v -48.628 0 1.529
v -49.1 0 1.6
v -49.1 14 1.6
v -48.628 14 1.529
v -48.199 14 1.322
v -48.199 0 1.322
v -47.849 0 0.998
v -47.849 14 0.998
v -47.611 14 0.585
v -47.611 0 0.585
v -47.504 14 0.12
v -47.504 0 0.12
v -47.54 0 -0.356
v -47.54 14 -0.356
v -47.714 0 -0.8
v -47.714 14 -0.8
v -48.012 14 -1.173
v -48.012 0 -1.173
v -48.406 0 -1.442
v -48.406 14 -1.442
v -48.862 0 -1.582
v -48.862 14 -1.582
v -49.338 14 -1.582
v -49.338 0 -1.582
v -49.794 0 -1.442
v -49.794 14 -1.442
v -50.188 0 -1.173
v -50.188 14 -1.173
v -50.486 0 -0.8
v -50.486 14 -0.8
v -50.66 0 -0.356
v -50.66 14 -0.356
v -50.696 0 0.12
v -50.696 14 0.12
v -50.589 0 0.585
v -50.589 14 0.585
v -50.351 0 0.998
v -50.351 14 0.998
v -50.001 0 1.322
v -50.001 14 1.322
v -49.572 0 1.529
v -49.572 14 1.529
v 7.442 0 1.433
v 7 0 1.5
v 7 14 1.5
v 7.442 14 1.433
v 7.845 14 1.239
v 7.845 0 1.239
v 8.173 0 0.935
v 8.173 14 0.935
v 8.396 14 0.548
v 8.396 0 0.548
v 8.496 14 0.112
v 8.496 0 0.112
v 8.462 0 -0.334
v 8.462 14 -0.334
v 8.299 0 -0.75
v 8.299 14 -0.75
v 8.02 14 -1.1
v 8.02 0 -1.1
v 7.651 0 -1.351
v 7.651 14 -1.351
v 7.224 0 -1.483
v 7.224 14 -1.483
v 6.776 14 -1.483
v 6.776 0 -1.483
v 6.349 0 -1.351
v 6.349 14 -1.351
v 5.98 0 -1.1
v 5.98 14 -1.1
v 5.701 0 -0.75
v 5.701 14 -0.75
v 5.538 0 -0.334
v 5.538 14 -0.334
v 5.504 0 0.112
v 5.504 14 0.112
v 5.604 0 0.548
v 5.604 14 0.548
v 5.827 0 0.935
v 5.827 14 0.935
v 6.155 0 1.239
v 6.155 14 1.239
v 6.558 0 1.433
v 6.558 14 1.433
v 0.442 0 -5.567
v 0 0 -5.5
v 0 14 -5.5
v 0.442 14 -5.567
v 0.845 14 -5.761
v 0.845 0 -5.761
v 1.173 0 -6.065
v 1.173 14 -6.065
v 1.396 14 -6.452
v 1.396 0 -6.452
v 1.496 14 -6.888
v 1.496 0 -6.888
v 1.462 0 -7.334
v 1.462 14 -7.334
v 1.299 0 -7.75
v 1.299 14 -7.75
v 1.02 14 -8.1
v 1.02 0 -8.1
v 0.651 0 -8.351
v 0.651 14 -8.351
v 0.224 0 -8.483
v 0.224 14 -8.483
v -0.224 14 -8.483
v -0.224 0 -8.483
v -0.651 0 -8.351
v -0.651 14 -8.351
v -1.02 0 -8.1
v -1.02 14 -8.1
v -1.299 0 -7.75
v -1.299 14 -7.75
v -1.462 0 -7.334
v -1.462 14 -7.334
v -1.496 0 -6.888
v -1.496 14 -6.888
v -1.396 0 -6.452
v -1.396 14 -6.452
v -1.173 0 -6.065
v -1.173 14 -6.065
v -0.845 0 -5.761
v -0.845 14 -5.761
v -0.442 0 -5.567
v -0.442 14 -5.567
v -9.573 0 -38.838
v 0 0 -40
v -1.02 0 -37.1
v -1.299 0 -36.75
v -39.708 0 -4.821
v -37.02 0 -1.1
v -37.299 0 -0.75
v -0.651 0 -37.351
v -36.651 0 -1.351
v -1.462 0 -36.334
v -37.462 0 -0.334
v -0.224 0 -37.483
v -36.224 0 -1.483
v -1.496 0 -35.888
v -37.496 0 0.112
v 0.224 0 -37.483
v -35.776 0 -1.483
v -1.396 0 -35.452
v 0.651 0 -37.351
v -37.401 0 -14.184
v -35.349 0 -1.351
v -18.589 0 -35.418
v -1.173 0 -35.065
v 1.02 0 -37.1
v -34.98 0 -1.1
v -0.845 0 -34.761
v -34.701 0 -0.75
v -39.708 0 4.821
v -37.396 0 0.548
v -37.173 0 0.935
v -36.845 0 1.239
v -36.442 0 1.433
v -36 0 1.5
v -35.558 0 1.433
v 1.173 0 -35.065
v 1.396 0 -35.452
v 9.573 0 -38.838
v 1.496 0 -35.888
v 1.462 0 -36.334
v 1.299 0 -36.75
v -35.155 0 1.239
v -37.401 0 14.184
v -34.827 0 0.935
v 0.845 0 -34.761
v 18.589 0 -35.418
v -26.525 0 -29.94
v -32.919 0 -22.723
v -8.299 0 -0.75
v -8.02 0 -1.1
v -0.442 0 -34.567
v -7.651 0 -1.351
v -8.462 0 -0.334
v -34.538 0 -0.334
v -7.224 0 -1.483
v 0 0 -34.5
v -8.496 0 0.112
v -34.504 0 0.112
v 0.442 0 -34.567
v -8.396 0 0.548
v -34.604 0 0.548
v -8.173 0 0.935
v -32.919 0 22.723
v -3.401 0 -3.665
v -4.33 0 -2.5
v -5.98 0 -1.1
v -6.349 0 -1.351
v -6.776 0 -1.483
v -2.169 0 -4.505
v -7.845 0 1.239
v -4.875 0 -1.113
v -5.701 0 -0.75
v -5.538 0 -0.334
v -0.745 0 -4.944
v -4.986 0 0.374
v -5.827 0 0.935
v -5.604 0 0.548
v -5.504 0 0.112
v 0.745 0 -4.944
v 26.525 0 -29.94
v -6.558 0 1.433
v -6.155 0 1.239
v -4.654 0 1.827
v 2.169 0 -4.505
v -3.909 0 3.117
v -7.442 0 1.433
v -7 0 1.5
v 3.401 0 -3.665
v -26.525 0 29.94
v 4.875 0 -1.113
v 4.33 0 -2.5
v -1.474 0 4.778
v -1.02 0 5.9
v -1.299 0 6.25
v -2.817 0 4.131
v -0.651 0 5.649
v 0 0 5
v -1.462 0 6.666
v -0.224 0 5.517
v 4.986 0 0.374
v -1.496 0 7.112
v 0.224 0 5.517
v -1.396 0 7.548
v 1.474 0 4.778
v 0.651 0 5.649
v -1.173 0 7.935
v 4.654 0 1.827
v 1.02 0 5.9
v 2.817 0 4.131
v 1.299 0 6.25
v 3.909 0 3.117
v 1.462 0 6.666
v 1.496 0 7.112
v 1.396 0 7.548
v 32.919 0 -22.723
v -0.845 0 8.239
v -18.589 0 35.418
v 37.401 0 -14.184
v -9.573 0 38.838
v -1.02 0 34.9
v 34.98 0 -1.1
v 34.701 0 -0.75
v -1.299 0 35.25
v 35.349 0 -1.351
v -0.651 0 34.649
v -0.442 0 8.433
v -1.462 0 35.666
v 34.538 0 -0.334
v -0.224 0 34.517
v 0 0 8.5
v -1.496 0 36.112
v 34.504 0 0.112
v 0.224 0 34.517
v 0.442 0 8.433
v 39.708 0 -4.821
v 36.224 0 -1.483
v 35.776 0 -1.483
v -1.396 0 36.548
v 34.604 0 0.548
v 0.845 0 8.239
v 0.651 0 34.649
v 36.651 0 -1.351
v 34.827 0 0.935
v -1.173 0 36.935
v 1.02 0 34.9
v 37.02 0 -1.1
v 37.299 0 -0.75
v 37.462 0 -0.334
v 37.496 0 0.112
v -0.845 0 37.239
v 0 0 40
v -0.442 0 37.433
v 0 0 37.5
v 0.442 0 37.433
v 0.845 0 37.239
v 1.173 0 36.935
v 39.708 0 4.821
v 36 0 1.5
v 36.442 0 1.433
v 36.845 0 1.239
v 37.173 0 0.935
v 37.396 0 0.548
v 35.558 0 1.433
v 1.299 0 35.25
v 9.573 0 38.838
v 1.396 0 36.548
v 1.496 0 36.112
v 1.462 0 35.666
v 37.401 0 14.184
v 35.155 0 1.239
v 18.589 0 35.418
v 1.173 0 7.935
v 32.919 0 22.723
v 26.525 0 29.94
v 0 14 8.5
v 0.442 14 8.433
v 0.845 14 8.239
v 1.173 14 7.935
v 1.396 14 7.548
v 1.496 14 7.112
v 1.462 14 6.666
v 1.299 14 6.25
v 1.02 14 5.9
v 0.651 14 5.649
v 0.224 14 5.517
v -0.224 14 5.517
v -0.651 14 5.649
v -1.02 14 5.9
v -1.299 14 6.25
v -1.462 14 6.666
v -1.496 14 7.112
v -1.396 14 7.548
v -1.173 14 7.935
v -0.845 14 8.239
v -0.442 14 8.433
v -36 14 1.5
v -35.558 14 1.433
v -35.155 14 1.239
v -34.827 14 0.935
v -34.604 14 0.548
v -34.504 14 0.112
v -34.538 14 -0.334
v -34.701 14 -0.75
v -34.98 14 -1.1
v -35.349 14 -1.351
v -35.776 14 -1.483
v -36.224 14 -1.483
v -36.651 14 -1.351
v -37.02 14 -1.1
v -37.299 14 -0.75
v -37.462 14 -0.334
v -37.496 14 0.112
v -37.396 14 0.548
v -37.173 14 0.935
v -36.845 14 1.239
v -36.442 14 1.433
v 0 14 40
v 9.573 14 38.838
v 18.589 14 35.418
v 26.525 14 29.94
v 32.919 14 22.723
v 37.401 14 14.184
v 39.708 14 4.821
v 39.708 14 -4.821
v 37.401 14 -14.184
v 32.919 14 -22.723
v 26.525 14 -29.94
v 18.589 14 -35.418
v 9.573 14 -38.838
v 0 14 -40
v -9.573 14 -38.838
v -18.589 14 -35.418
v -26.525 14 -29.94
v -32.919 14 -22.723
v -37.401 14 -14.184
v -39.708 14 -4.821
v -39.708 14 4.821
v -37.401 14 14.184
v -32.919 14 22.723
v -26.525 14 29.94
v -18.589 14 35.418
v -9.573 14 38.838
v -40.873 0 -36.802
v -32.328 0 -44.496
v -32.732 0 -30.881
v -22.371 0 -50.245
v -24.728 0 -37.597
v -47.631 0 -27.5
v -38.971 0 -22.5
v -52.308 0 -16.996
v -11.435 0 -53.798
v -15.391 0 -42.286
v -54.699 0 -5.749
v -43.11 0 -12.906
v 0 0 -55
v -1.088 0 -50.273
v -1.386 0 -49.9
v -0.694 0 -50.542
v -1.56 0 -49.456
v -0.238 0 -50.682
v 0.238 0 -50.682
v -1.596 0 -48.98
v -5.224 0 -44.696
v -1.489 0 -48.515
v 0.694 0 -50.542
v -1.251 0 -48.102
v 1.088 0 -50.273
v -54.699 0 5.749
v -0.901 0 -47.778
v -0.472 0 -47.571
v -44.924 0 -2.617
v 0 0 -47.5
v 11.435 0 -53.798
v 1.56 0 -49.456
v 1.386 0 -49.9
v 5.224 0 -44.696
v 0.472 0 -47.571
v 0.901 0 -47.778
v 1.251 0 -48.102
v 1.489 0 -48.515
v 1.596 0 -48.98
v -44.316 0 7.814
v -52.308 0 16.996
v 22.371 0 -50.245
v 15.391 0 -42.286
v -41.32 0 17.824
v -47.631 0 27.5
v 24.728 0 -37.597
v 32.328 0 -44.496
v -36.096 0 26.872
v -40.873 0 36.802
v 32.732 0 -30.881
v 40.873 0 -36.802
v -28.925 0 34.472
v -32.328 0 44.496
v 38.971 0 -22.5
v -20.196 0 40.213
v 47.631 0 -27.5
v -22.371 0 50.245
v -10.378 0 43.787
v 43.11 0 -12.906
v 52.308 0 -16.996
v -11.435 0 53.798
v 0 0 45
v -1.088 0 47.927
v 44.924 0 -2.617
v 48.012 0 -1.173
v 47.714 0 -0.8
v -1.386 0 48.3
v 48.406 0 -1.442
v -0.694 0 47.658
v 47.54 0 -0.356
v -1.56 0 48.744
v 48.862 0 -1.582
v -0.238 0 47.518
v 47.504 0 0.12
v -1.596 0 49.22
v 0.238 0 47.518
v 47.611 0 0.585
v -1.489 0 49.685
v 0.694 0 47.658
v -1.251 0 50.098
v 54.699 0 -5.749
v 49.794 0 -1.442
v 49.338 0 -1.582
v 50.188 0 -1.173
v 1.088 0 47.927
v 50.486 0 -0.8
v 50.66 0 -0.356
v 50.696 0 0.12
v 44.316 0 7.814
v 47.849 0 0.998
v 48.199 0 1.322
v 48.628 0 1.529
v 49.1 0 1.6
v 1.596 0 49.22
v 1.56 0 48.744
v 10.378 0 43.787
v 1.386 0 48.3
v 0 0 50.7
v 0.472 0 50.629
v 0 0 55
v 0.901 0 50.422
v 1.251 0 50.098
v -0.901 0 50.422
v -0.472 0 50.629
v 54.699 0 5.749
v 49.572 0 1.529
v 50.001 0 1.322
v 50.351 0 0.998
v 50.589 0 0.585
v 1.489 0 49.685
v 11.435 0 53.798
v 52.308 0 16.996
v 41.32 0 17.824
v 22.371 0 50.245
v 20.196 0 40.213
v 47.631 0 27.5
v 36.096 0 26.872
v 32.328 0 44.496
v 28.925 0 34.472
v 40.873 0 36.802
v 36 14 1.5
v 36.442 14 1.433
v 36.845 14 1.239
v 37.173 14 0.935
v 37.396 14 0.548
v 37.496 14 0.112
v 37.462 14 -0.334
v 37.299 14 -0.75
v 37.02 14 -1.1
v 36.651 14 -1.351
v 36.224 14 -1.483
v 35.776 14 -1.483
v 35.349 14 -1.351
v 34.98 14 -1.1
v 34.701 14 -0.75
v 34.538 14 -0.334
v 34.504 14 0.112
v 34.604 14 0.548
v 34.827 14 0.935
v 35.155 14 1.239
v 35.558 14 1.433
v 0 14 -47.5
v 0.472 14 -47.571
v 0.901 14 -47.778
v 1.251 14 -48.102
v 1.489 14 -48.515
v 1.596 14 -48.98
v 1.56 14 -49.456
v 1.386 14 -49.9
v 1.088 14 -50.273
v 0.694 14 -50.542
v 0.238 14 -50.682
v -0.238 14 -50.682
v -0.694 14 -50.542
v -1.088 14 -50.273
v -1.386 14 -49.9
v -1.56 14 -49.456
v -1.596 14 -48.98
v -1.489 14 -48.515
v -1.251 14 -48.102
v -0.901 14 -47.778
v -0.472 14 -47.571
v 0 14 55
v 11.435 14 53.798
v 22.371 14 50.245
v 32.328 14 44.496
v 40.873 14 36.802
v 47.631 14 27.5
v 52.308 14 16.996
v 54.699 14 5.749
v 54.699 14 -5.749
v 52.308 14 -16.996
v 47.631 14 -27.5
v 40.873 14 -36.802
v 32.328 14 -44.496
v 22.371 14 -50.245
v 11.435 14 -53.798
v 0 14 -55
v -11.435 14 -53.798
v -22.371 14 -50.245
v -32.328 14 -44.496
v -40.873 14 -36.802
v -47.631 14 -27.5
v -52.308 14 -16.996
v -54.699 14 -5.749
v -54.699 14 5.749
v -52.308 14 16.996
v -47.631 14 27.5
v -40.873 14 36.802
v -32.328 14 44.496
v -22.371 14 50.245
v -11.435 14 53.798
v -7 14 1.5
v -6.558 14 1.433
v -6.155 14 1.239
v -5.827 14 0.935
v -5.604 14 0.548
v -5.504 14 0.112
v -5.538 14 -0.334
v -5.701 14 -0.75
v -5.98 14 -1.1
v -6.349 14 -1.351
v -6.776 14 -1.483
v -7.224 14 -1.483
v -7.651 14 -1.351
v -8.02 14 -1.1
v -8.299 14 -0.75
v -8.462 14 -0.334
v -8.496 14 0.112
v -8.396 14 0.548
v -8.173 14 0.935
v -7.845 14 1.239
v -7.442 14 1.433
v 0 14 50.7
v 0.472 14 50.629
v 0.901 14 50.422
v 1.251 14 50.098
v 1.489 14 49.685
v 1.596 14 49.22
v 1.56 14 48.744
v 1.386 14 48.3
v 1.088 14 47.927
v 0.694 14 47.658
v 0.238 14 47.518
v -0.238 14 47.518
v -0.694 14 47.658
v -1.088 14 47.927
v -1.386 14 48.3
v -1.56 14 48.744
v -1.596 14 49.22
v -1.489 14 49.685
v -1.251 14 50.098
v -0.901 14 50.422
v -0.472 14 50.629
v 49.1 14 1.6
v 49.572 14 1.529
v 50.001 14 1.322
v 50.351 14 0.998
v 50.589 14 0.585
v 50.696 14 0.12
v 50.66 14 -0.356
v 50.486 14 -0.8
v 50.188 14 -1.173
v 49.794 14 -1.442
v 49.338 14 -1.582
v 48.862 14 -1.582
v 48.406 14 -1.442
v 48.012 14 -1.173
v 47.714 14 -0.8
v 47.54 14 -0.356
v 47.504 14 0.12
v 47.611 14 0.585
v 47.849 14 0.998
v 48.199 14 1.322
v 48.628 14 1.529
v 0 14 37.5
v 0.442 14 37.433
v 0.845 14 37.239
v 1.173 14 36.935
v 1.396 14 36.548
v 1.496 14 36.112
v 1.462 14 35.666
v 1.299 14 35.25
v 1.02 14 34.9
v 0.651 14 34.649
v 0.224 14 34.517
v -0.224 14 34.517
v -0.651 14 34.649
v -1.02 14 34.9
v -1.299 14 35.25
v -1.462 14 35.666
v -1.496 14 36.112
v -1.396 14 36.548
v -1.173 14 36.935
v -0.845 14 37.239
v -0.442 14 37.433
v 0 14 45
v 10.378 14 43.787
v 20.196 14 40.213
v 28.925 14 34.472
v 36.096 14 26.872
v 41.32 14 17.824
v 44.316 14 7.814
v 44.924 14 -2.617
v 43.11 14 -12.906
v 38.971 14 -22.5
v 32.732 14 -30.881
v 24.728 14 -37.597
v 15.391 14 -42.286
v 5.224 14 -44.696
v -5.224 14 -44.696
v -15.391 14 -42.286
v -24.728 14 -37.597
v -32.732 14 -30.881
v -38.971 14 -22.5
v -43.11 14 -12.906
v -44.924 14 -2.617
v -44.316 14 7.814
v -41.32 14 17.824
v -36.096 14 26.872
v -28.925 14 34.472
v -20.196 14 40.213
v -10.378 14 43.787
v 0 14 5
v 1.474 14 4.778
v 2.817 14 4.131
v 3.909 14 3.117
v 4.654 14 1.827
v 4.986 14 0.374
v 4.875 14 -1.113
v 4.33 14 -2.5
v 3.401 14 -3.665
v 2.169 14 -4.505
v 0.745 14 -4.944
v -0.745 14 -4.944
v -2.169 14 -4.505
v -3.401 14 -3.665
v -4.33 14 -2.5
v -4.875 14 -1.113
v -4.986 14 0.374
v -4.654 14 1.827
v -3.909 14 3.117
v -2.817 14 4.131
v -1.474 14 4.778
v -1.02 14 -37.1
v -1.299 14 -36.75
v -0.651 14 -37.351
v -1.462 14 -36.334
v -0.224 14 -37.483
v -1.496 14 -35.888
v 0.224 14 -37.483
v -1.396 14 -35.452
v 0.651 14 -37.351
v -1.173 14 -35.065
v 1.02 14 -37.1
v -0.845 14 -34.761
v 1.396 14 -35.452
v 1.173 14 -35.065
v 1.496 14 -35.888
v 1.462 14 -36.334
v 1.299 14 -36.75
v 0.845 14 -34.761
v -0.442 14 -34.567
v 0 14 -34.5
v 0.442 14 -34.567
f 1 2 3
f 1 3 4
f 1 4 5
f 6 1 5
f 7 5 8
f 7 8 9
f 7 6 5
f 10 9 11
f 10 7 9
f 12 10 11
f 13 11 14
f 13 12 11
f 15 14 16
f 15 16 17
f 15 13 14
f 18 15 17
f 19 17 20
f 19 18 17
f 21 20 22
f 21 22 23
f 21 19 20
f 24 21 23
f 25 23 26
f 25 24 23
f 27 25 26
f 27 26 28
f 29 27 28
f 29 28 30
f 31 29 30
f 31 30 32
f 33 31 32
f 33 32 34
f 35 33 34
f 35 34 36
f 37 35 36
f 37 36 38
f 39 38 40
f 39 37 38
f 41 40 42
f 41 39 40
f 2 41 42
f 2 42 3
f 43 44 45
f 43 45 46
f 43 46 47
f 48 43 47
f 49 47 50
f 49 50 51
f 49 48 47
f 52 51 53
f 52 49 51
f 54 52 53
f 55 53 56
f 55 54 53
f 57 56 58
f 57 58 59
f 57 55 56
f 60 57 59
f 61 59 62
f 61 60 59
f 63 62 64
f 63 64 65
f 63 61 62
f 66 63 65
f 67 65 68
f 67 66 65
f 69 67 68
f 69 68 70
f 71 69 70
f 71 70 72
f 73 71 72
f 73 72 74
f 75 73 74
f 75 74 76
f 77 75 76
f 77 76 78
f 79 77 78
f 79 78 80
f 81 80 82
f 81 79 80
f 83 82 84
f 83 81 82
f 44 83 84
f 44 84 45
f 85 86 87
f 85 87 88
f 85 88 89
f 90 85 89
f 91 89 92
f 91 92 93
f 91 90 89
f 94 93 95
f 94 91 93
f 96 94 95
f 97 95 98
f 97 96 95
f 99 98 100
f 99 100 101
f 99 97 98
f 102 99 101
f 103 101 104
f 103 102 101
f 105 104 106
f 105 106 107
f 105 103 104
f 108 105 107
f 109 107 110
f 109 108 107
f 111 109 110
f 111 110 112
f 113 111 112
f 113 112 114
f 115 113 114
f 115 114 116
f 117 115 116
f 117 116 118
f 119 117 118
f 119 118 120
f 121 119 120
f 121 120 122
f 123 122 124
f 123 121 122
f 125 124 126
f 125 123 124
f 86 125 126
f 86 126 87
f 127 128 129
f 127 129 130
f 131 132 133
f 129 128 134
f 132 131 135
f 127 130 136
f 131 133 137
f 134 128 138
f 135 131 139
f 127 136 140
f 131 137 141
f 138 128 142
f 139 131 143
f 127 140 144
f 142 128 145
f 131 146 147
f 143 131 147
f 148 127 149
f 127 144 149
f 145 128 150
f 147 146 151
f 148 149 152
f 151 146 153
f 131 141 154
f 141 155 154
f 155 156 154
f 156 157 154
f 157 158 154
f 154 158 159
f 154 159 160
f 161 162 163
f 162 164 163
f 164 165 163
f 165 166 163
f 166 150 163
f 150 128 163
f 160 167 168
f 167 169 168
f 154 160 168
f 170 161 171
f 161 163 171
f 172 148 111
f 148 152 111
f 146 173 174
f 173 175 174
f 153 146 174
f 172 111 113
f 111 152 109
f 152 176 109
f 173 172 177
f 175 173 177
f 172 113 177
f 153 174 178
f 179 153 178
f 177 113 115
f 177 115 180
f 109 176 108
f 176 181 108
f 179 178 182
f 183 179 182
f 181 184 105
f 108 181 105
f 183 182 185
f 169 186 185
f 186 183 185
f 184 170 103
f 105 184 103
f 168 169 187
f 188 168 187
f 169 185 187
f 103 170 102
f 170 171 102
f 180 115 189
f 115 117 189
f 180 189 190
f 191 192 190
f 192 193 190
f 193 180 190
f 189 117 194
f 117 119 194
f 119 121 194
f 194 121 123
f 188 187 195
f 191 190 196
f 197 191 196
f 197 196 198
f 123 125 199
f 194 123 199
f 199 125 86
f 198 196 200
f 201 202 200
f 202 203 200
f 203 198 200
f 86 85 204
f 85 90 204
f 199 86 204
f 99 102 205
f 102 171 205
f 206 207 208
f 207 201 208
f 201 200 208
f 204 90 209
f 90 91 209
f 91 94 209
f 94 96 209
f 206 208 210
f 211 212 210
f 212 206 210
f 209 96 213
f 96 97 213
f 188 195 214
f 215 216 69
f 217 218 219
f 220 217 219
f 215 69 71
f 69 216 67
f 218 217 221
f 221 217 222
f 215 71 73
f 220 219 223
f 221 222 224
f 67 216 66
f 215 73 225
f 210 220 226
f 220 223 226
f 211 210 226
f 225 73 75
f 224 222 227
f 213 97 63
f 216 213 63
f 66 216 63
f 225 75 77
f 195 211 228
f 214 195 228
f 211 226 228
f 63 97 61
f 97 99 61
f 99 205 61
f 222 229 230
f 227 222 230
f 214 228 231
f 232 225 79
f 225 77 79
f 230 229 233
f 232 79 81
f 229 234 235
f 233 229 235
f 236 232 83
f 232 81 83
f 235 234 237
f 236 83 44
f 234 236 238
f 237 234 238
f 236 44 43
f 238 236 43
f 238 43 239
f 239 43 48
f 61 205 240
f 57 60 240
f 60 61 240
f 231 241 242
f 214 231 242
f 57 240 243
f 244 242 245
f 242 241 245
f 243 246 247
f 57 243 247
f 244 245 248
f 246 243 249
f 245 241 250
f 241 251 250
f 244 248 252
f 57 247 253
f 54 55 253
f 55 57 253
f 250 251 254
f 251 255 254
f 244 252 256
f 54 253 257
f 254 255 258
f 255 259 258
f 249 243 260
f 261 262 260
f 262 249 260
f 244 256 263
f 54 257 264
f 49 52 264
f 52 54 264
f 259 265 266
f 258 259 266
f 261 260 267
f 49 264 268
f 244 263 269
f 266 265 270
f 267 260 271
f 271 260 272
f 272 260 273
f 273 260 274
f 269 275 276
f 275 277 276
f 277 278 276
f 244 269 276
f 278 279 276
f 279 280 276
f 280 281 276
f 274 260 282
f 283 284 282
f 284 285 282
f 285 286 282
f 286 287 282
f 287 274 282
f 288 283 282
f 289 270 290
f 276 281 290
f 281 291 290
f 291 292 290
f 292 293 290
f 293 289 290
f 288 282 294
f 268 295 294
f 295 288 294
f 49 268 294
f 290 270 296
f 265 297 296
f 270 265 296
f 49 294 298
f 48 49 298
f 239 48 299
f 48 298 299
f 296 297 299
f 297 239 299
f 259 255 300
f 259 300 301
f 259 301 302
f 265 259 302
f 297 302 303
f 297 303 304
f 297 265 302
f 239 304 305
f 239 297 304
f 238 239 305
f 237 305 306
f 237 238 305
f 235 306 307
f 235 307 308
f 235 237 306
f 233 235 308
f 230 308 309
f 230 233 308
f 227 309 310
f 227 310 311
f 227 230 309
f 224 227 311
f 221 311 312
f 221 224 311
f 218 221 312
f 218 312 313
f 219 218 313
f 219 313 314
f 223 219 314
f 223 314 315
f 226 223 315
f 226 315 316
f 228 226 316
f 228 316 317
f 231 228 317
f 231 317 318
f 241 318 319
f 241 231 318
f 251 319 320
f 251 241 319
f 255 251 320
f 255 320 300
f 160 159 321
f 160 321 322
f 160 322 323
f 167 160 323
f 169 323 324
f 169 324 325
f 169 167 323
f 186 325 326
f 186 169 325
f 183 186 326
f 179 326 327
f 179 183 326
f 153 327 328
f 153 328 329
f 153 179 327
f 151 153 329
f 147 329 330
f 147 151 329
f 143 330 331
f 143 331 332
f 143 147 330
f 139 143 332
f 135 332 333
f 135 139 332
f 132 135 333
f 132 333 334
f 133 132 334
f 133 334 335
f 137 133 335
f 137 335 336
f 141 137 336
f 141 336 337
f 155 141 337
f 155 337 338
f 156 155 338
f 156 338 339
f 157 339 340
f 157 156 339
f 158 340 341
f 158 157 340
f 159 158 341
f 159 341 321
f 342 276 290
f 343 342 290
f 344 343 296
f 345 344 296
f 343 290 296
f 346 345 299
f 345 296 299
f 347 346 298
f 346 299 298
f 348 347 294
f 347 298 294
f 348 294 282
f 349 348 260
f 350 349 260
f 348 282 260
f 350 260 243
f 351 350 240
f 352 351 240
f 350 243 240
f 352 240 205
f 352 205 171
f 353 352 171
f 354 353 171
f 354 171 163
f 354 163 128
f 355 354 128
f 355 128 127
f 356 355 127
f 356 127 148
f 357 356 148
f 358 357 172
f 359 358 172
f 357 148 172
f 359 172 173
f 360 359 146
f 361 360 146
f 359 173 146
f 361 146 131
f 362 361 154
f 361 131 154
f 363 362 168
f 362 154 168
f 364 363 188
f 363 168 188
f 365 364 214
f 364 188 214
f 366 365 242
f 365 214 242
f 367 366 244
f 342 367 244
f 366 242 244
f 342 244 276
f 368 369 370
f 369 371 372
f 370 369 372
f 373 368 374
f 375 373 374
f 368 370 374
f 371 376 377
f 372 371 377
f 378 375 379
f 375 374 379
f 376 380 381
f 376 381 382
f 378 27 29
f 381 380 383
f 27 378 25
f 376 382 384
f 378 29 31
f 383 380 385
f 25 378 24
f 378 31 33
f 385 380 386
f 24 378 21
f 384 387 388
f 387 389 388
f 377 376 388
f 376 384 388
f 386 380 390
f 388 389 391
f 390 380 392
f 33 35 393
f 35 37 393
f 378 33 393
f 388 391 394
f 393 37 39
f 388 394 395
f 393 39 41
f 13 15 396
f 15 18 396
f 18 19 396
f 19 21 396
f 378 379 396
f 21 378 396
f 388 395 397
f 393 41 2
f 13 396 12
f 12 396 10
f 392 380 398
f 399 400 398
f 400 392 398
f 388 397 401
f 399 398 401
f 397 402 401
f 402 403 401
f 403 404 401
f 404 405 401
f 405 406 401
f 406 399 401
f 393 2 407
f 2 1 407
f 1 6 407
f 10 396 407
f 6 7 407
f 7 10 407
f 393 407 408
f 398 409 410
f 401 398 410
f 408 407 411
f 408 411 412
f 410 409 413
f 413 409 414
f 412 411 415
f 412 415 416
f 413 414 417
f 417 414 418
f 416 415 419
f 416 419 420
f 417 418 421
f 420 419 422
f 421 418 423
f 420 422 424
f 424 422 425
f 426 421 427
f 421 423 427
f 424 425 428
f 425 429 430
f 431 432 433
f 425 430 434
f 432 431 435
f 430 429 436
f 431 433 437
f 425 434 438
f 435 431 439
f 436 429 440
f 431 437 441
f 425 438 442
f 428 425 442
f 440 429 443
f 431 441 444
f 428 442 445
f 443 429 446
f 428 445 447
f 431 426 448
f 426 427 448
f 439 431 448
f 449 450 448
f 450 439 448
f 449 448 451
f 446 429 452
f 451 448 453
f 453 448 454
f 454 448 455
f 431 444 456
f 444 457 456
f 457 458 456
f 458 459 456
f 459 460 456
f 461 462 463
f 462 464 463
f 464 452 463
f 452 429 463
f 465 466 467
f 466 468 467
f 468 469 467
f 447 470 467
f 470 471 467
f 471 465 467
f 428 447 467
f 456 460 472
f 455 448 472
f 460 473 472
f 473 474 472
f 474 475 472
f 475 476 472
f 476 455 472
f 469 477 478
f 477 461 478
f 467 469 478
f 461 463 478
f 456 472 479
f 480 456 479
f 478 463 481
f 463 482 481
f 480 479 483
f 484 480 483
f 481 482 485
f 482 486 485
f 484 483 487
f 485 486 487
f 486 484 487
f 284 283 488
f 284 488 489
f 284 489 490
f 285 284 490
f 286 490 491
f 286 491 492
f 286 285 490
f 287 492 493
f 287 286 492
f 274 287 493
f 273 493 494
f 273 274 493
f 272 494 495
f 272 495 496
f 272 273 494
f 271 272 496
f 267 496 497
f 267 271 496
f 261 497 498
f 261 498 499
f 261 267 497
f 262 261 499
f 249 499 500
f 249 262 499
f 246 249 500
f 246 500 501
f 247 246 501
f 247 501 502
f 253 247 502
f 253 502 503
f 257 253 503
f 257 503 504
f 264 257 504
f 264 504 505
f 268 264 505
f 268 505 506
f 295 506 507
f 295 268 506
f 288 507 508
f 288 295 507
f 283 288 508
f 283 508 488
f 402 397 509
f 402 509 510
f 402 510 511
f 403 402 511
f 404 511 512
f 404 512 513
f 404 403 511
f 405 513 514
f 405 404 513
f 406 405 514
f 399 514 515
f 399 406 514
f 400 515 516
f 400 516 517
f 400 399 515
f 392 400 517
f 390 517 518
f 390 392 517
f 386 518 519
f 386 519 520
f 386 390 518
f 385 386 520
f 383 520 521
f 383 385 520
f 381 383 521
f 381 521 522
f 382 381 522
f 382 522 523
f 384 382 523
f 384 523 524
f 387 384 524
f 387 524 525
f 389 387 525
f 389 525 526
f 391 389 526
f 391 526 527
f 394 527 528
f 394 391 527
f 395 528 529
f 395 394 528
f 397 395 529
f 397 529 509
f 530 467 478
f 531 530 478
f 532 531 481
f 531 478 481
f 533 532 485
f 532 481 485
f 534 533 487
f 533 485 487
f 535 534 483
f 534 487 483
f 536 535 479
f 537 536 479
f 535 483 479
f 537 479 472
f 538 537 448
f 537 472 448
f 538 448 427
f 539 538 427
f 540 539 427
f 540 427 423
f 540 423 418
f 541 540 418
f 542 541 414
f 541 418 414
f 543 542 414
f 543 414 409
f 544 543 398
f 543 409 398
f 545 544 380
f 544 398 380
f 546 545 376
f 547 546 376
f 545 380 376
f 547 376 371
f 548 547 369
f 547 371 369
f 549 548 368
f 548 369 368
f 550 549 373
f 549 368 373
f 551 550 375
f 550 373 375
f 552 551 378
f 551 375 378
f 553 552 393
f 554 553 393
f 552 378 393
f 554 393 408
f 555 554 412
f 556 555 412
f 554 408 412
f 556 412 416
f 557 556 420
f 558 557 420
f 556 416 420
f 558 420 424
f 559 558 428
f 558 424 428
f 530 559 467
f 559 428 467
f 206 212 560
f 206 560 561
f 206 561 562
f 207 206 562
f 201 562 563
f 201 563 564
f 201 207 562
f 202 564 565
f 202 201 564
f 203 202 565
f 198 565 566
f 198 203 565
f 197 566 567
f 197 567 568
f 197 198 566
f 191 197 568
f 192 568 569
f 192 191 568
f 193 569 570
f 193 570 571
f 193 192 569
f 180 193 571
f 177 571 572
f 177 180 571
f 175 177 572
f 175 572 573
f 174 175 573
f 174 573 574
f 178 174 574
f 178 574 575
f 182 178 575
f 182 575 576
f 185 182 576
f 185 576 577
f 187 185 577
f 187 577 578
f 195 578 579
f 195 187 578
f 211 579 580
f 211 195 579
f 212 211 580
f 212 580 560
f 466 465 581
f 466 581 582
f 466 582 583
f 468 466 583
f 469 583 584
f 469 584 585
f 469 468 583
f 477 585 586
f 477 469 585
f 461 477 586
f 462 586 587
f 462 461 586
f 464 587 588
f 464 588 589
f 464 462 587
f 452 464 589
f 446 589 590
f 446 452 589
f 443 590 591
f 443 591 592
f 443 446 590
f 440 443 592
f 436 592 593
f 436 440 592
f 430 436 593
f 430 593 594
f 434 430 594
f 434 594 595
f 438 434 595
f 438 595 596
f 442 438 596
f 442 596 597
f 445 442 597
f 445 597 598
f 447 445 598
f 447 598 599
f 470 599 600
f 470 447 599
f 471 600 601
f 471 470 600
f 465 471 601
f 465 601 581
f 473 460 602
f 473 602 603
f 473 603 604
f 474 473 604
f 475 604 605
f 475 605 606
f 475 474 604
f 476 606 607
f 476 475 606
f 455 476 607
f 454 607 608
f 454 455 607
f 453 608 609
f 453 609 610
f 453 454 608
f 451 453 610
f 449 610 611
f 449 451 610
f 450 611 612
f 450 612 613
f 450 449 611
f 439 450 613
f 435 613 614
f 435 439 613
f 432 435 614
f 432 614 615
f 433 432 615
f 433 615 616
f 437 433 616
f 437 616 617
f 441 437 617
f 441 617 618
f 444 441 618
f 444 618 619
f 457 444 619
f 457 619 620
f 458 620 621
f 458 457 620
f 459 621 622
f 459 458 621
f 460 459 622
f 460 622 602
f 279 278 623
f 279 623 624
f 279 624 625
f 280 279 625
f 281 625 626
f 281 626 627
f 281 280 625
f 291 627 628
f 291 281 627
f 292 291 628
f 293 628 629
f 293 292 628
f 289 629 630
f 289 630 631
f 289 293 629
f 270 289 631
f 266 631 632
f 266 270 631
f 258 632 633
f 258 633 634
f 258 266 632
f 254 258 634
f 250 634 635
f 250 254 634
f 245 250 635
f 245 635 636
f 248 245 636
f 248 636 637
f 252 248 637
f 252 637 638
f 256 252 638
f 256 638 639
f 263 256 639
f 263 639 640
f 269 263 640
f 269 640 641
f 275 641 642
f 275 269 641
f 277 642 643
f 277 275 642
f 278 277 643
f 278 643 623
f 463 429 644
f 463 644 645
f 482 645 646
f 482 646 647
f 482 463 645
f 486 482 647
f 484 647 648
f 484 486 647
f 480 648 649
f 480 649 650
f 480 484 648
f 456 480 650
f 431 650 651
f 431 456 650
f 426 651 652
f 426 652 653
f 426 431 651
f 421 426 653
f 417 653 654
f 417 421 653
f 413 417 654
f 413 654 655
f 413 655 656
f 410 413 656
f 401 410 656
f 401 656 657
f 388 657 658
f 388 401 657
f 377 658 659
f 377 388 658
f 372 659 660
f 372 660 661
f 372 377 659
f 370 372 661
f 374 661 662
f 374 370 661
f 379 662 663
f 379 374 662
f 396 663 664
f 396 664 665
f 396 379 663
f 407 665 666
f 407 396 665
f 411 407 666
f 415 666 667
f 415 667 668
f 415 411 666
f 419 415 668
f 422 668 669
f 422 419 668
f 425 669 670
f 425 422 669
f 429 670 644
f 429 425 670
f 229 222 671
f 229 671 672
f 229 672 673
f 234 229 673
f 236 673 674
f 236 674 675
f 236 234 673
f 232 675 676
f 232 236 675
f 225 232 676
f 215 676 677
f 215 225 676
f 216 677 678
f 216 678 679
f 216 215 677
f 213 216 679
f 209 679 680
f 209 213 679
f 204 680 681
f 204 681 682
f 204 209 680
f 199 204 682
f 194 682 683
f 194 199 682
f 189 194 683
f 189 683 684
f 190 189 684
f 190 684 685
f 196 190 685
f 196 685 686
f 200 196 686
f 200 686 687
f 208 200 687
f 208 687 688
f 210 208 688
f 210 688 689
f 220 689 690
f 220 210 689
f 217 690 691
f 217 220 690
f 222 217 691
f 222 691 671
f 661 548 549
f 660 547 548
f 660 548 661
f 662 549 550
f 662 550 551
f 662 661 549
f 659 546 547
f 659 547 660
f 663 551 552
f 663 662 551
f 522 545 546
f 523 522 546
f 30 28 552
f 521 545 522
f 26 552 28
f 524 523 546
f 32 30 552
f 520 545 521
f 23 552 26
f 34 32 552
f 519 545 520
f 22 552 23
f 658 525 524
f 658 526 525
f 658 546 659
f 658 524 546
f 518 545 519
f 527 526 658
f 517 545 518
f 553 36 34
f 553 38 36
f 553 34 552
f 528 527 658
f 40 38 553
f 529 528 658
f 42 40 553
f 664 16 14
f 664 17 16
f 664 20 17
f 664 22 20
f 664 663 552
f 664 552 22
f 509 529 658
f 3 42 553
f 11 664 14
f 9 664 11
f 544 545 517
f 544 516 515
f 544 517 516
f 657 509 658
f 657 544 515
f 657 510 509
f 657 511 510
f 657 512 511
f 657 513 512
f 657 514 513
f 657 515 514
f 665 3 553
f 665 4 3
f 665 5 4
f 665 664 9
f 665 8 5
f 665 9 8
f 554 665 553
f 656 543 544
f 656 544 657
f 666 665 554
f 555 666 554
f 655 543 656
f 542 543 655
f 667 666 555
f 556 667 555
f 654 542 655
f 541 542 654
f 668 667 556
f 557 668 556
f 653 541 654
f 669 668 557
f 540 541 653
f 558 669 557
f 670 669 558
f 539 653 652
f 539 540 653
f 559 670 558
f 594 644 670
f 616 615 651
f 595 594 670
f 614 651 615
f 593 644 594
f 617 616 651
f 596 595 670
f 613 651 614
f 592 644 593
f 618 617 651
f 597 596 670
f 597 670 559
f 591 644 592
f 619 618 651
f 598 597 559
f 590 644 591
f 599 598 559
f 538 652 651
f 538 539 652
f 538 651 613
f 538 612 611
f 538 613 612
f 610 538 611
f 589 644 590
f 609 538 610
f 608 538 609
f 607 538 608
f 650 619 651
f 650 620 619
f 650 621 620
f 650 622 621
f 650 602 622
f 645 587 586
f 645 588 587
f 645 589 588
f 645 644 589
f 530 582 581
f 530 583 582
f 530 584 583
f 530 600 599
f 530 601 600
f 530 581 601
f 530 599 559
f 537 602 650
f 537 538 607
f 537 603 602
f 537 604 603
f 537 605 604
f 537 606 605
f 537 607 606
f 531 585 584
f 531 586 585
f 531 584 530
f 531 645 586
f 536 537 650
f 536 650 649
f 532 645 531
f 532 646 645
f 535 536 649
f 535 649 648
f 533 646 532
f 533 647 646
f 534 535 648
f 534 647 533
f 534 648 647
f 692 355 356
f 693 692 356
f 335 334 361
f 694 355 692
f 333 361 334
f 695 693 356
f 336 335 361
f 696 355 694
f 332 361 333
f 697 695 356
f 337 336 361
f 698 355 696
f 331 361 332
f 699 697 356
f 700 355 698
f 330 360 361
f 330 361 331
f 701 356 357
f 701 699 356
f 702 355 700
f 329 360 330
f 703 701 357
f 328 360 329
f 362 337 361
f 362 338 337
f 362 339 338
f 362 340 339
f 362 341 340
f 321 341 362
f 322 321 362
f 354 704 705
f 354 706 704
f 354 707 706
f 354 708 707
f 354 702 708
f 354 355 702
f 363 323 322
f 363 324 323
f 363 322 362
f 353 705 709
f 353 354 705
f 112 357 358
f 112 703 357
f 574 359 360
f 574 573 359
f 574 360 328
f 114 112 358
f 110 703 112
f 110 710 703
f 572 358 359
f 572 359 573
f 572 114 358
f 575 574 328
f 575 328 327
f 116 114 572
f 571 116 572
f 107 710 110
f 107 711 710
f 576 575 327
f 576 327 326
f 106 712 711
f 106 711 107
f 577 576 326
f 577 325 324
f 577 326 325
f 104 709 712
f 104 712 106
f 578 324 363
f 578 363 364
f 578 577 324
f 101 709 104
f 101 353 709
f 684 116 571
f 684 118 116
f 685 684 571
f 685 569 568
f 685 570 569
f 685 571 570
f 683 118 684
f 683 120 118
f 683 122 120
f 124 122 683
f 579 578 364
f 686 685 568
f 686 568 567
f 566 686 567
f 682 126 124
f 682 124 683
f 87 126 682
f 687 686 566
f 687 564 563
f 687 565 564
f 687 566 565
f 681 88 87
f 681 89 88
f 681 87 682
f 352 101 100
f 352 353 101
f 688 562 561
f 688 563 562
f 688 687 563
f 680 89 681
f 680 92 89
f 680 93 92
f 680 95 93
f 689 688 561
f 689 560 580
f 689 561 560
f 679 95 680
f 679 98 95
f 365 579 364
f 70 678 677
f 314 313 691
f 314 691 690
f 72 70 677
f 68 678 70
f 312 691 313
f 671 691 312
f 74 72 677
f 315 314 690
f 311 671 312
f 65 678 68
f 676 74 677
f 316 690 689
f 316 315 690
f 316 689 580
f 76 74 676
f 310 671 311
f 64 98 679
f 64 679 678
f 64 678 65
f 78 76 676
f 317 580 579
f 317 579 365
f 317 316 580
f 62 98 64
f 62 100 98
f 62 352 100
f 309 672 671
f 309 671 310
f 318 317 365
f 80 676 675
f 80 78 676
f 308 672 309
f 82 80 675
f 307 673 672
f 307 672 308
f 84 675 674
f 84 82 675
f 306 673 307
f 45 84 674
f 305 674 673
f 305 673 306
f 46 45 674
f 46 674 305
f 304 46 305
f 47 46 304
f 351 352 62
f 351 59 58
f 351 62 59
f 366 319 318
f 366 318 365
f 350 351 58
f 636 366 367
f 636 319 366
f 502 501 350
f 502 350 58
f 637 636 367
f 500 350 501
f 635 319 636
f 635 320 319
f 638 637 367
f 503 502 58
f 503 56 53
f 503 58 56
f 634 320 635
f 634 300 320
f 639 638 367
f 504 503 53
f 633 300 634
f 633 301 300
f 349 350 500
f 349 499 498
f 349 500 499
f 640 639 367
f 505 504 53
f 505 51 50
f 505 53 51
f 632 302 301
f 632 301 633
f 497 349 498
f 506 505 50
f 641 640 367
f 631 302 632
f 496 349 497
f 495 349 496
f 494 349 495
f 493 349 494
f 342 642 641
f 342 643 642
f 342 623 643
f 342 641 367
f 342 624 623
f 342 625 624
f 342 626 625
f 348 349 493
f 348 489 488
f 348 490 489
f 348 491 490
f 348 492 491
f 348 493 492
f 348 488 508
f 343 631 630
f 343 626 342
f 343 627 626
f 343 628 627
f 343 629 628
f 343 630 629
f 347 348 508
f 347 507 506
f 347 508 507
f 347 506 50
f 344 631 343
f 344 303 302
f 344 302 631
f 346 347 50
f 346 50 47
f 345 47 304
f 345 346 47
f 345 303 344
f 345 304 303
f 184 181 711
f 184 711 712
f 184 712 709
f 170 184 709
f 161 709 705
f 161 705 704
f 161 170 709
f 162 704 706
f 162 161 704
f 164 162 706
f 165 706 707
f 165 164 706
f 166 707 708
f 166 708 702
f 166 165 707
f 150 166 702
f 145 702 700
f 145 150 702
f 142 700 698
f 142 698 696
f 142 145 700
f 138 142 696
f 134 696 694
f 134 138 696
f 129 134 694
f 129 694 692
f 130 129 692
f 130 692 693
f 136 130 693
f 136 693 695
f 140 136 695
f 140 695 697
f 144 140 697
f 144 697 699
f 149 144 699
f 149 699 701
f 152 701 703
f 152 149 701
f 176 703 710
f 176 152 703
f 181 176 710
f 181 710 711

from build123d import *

# Parameters (mm, degrees)
SKETCH_1_R        = 55
SKETCH_1_R_2      = 1.6
SKETCH_1_R_3      = 45
EXTRUDE_9_DEPTH   = 14
SKETCH_1_R_4      = 40
SKETCH_1_R_5      = 1.5
SKETCH_1_R_6      = 5
EXTRUDE_9_2_DEPTH = 14


with BuildPart() as part:
    # 草图1 → 凸台-拉伸9 (new body)
    with BuildSketch(Plane(origin=(0, 0, 0), x_dir=(1, 0, 0), z_dir=(0, 1, 0))):
        with Locations(Location((0, 0, 0), (0, 0, 270))):
            Circle(SKETCH_1_R)
        with Locations(Location((0, -49.1, 0), (0, 0, 270))):
            Circle(SKETCH_1_R_2, mode=Mode.SUBTRACT)
        with Locations(Location((0, 49.1, 0), (0, 0, 270))):
            Circle(SKETCH_1_R_2, mode=Mode.SUBTRACT)
        with Locations(Location((49.1, 0, 0), (0, 0, 270))):
            Circle(SKETCH_1_R_2, mode=Mode.SUBTRACT)
        with Locations(Location((-49.1, 0, 0), (0, 0, 270))):
            Circle(SKETCH_1_R_2, mode=Mode.SUBTRACT)
        with Locations(Location((0, 0, 0), (0, 0, 270))):
            Circle(SKETCH_1_R_3, mode=Mode.SUBTRACT)
    extrude(amount=EXTRUDE_9_DEPTH)


with BuildPart() as body_2:
    # 草图1 → Extrude 9 2 (new body)
    with BuildSketch(Plane(origin=(0, 0, 0), x_dir=(1, 0, 0), z_dir=(0, 1, 0))):
        with Locations(Location((0, 0, 0), (0, 0, 270))):
            Circle(SKETCH_1_R_4)
        with Locations(Location((0, -36, 0), (0, 0, 270))):
            Circle(SKETCH_1_R_5, mode=Mode.SUBTRACT)
        with Locations(Location((0, 36, 0), (0, 0, 270))):
            Circle(SKETCH_1_R_5, mode=Mode.SUBTRACT)
        with Locations(Location((36, 0, 0), (0, 0, 270))):
            Circle(SKETCH_1_R_5, mode=Mode.SUBTRACT)
        with Locations(Location((-36, 0, 0), (0, 0, 270))):
            Circle(SKETCH_1_R_5, mode=Mode.SUBTRACT)
        with Locations(Location((0, -7, 0), (0, 0, 270))):
            Circle(SKETCH_1_R_5, mode=Mode.SUBTRACT)
        with Locations(Location((-7, 0, 0), (0, 0, 270))):
            Circle(SKETCH_1_R_5, mode=Mode.SUBTRACT)
        with Locations(Location((0, 7, 0), (0, 0, 270))):
            Circle(SKETCH_1_R_5, mode=Mode.SUBTRACT)
        with Locations(Location((7, 0, 0), (0, 0, 270))):
            Circle(SKETCH_1_R_5, mode=Mode.SUBTRACT)
        with Locations(Location((0, 0, 0), (0, 0, 270))):
            Circle(SKETCH_1_R_6, mode=Mode.SUBTRACT)
    extrude(amount=EXTRUDE_9_2_DEPTH)


solid = Compound([part.part, body_2.part])
